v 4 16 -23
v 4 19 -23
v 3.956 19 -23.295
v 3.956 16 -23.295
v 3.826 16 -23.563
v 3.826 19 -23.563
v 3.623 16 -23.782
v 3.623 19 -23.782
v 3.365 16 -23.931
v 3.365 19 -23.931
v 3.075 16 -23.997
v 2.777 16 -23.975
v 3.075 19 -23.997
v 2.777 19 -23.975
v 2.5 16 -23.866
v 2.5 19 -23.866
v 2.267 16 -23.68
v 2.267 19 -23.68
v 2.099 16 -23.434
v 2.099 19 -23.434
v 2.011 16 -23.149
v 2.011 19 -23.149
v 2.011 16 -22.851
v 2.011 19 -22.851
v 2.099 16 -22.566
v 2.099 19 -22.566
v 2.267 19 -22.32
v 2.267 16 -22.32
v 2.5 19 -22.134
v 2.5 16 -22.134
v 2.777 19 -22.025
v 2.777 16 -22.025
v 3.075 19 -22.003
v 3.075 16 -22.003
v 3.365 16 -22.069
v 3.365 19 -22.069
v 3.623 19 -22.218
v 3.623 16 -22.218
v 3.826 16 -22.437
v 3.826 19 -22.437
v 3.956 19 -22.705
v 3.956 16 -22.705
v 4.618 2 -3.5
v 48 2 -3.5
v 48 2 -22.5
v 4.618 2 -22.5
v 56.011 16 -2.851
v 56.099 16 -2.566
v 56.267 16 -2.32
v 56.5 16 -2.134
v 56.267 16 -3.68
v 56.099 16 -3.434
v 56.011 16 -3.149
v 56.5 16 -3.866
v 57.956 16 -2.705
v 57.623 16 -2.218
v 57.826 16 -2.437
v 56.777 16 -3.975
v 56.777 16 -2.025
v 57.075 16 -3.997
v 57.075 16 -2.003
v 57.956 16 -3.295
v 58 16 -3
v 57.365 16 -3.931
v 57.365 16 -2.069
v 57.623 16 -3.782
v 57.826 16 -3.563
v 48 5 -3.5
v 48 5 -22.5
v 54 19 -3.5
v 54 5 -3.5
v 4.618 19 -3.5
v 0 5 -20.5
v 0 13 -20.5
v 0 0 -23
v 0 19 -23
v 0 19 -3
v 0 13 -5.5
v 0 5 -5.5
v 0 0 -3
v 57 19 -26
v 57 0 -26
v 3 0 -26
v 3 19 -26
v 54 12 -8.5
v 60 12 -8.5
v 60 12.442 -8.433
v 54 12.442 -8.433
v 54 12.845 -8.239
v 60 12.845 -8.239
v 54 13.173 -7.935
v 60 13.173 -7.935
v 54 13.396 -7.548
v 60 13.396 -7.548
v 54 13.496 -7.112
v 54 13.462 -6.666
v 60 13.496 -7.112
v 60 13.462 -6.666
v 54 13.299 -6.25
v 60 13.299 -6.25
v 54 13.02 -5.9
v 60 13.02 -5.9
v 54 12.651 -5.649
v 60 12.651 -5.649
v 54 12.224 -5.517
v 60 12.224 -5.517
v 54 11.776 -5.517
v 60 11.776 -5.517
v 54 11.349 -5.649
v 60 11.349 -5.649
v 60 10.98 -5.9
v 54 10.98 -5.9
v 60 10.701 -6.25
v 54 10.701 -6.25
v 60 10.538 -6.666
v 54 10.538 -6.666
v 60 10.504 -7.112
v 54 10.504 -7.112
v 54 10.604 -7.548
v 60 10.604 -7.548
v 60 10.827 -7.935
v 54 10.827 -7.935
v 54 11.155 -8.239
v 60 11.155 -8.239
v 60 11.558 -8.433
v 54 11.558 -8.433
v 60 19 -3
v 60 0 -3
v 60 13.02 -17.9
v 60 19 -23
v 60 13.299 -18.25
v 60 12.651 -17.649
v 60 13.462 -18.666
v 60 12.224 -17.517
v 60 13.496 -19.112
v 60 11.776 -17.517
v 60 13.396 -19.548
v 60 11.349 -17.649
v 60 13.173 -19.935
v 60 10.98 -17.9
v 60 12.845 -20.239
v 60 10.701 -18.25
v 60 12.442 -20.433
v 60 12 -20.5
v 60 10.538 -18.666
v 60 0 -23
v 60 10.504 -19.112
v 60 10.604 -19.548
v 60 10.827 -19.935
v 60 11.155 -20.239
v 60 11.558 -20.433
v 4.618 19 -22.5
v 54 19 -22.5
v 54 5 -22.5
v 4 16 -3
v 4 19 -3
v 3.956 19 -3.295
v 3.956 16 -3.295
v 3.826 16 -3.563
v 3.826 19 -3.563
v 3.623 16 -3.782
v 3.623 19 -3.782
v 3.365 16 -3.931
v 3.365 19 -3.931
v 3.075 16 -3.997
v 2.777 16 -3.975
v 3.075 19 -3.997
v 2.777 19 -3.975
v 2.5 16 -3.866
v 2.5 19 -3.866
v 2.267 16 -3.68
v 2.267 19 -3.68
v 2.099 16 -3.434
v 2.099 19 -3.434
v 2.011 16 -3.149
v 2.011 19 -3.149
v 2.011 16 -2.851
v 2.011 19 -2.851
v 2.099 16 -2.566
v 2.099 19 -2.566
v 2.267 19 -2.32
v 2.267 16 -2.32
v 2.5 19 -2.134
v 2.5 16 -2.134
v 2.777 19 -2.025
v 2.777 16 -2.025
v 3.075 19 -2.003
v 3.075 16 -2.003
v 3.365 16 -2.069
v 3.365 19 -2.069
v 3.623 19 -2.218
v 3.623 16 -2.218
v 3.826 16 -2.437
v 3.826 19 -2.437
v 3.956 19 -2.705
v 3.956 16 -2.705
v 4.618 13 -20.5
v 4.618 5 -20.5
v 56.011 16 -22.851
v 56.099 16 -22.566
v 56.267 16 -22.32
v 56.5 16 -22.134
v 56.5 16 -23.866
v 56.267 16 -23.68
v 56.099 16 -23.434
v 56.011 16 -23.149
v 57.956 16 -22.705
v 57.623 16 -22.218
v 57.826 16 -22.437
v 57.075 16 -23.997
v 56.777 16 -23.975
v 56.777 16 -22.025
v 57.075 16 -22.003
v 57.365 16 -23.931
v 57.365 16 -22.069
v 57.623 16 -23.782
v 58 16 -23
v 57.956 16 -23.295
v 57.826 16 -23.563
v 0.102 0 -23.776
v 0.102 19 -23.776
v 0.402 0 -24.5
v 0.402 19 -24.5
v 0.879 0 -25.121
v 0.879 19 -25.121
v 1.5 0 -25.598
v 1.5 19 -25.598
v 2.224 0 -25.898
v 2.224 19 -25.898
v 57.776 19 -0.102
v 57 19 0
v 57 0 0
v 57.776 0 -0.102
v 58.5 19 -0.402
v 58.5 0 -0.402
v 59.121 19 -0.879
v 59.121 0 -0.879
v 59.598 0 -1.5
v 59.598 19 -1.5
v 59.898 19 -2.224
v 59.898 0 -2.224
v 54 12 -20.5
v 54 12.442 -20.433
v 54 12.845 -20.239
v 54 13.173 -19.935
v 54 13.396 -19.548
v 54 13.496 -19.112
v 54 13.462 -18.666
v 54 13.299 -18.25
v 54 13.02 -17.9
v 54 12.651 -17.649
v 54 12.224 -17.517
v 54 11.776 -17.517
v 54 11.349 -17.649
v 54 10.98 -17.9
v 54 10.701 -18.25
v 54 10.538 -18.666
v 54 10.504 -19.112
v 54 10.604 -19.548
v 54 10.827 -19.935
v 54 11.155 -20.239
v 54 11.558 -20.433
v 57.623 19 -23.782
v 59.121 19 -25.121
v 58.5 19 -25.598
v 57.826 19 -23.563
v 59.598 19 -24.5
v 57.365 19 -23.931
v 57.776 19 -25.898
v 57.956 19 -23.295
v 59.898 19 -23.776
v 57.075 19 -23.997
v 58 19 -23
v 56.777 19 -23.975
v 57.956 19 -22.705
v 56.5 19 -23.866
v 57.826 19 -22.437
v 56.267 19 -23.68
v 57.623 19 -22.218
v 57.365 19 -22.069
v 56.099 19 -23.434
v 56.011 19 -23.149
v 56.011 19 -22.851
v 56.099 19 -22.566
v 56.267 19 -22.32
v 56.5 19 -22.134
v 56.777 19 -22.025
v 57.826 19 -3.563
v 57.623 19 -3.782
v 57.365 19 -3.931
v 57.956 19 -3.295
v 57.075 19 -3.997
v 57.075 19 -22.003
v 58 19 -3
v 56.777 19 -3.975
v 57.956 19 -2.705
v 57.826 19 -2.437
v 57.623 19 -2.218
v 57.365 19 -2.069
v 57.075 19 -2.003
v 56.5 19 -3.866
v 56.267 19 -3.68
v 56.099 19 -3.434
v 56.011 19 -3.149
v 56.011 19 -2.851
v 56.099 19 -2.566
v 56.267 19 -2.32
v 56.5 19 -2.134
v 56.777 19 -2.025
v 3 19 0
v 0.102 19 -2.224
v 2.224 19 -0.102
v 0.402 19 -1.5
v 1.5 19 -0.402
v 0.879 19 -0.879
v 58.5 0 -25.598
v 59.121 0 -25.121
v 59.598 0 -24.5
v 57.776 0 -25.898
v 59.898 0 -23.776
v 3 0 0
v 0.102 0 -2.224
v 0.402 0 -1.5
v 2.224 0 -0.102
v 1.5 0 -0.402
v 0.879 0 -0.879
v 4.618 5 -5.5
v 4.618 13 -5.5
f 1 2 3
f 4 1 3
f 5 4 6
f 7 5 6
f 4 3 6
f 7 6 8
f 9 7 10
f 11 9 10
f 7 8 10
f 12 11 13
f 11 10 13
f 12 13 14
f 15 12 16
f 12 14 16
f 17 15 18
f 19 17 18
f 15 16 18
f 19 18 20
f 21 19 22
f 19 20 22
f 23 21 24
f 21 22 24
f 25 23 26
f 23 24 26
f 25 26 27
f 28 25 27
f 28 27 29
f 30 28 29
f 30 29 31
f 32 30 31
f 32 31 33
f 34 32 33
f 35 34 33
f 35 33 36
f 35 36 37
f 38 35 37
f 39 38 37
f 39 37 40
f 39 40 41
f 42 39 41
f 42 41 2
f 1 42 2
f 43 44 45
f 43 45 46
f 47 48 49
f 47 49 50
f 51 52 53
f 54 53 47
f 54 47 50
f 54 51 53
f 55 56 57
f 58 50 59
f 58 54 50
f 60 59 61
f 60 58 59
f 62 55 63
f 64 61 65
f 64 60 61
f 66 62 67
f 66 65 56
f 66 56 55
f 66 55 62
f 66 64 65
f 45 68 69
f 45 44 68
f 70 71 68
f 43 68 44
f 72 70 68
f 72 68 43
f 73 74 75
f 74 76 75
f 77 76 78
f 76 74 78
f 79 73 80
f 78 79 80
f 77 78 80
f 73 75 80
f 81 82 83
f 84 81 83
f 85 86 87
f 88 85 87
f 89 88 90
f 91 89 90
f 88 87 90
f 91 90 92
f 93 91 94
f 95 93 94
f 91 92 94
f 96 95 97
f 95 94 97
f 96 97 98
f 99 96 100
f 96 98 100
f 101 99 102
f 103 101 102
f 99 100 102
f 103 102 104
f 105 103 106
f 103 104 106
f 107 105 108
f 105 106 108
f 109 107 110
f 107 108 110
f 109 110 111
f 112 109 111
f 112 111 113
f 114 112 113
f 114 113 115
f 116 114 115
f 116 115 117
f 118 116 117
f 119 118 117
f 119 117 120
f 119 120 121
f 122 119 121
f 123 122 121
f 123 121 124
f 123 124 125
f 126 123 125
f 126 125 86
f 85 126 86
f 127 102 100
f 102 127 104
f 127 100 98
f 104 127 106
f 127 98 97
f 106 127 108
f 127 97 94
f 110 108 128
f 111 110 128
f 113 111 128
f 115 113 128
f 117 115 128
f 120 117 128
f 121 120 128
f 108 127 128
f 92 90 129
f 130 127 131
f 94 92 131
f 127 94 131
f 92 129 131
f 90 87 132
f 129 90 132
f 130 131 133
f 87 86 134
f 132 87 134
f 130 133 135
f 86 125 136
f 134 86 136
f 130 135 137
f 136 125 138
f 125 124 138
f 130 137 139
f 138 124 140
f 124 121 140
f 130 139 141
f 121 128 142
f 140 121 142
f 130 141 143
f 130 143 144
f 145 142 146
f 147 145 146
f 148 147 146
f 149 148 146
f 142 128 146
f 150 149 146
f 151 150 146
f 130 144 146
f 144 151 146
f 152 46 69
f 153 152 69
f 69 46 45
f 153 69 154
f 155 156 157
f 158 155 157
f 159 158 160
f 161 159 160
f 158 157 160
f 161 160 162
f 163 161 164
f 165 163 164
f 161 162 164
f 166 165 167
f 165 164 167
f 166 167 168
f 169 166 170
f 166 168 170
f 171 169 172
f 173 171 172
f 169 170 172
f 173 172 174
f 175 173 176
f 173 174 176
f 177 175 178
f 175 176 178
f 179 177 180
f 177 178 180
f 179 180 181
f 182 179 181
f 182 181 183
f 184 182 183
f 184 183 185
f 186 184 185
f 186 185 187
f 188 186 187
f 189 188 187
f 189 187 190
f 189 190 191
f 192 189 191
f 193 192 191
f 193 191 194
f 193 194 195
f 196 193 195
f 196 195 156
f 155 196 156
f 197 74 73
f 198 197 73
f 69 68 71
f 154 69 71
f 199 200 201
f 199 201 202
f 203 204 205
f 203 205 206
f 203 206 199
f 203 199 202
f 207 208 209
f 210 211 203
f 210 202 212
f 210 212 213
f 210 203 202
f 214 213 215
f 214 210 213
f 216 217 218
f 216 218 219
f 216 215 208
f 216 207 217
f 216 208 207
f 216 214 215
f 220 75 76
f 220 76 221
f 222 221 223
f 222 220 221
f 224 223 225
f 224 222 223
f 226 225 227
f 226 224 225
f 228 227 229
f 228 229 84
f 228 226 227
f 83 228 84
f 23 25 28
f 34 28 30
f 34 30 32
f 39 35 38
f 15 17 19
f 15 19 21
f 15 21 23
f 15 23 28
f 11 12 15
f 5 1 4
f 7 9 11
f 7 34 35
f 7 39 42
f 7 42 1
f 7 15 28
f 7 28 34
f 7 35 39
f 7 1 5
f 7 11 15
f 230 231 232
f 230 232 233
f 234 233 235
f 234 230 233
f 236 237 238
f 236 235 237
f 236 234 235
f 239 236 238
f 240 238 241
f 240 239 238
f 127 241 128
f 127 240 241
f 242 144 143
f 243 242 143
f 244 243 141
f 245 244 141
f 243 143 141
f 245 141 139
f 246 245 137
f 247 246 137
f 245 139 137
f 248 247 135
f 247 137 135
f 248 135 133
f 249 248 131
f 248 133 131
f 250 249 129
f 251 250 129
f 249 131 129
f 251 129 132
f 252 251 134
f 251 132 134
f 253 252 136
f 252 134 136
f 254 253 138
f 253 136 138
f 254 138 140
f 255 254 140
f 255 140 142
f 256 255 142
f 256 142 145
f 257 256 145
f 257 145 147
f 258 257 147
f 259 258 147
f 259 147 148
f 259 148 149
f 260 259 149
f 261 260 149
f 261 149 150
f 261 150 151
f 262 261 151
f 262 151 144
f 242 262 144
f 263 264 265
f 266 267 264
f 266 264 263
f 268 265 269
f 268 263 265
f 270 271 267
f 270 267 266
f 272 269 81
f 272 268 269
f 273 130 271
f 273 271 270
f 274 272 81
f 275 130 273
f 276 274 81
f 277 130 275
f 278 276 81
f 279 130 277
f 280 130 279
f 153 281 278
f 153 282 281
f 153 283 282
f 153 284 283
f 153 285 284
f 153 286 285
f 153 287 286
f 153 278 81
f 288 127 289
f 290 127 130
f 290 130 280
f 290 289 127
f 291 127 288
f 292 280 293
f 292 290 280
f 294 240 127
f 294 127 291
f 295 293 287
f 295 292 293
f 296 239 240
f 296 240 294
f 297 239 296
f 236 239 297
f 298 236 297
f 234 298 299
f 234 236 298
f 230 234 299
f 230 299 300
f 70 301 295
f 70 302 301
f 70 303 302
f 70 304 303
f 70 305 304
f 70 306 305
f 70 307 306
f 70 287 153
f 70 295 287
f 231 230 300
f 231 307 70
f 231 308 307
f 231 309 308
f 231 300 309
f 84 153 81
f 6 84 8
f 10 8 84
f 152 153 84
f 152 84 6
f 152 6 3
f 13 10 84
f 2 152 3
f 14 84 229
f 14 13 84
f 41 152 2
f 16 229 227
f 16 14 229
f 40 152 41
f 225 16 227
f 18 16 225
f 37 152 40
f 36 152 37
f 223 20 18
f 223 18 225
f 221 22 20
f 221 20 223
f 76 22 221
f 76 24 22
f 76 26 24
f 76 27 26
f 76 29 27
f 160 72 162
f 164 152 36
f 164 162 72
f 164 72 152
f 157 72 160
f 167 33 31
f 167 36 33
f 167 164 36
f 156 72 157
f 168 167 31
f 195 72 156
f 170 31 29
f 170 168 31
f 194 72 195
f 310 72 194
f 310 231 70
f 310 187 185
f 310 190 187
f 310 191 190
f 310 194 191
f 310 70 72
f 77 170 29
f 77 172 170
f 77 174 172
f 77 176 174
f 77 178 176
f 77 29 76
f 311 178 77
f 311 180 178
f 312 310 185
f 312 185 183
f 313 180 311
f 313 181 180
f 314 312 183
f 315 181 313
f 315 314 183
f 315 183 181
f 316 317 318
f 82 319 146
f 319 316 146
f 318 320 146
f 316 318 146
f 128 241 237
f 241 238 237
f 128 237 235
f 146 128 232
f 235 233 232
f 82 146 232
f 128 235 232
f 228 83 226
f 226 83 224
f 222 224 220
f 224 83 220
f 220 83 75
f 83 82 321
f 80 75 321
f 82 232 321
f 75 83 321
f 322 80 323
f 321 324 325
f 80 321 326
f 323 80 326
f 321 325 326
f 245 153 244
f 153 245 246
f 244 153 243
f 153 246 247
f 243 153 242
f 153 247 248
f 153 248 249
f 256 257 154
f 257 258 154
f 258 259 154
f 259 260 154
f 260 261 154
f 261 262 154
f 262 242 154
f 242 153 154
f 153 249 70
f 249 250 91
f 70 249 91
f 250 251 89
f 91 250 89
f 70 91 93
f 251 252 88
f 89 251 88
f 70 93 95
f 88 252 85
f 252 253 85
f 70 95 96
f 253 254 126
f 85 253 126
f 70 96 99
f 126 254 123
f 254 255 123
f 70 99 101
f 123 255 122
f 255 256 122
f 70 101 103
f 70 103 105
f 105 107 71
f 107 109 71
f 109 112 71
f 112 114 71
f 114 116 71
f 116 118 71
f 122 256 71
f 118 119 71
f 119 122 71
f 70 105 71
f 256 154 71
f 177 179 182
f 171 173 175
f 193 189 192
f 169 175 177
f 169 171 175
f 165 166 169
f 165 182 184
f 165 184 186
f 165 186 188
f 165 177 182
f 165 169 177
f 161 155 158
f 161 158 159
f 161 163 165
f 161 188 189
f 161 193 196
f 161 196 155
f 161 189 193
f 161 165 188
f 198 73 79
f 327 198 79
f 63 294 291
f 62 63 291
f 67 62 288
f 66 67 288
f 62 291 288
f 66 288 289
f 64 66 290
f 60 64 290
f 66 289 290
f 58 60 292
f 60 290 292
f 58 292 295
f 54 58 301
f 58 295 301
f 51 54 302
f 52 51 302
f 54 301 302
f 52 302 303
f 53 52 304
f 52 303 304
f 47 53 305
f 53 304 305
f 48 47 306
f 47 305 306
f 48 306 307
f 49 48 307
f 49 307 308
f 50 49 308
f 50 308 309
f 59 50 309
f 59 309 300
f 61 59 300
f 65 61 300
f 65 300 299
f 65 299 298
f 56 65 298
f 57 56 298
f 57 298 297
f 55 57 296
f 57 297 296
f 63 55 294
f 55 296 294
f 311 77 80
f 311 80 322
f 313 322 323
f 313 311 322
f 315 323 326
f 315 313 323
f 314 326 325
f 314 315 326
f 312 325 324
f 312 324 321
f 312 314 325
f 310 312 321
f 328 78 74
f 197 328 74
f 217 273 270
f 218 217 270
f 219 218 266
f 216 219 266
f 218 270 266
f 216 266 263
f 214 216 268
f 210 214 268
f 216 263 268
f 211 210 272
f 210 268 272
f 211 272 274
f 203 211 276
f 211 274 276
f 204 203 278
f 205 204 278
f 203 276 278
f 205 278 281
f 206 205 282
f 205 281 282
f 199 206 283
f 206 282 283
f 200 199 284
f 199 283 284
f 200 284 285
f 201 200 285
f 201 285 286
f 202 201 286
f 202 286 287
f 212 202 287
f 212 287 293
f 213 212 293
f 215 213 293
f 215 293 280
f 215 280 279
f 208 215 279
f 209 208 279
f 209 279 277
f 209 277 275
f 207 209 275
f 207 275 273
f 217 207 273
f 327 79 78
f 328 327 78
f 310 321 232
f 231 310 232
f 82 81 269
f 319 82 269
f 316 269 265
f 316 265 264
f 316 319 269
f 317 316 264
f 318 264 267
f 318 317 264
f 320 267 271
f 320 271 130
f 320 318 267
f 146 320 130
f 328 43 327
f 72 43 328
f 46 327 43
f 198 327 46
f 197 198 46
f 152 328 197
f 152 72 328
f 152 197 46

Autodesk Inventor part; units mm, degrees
ref_plane "YZ Plane" through (0, 0, 0) normal (1, 0, 0) x (0, 1, 0)
ref_plane "XZ Plane" through (0, 0, 0) normal (0, 1, 0) x (-1, 0, 0)
ref_plane "XY Plane" through (0, 0, 0) normal (0, 0, 1) x (1, 0, 0)
sketch "Sketch1" plane through (0, 0, 0) normal (0, 1, 0) x (-1, 0, 0)
  line L0 (0, 0) -> (-60, 0)
  line L1 (-60, 0) -> (-60, -26)
  line L2 (-60, -26) -> (0, -26)
  line L3 (0, -26) -> (0, 0)
  line L4 (-54, -3.5) -> (-6, -3.5)
  line L5 (-6, -3.5) -> (-6, -22.5)
  line L6 (-6, -22.5) -> (-54, -22.5)
  line L7 (-54, -22.5) -> (-54, -3.5)
  line L8 (-54, -3.5) -> (-6, -22.5) construction
  line L9 (-6, -3.5) -> (-54, -22.5) construction
  point P0 (-30, -13)
  dimension "d0" = 60
  dimension "d2" = 48
  dimension "d3" = 6
  dimension "d4" = 6
  dimension "d36" = 19
  dimension "d37" = 3.5
  dimension "d38" = 3.5
  dimension "d39" = 26
extrude "Extrusion1" add sketch "Sketch1" along normal blind 2 contours L3 L2 L1 L0 | L4 L5 L6 L7
extrude "Extrusion2" add sketch "Sketch1" along normal blind 19
sketch "Sketch2" plane through (0, 2, 0) normal (0, 1, 0) x (1, 0, 0)
  line L0 (6, 3.5) -> (54, 3.5) projected
  line L1 (54, 22.5) -> (6, 22.5) projected
  line L2 (54, 3.5) -> (48, 3.5)
  line L3 (48, 3.5) -> (48, 22.5)
  line L4 (48, 22.5) -> (54, 22.5)
  line L5 (54, 22.5) -> (54, 3.5)
  line L6 (6, 3.5) -> (6, 22.5) projected
  point P0 (0, 0)
  point P1 (48, 3.5)
  dimension "d11" = 42
extrude "Extrusion3" add sketch "Sketch2" along normal blind 3 contours L3 L1 L5 L0
sketch "Sketch3" plane through (0, 0, -3) normal (1, 0, 0) x (0, 0, -1)
  line L0 (-3, 0) -> (23, 0) projected
  line L1 (23, 0) -> (23, 19) projected
  line L2 (-3, 19) -> (23, 19) projected
  line L3 (-3, 0) -> (-3, 19) projected
  line L4 (2.5, 13) -> (17.5, 13)
  line L5 (17.5, 13) -> (17.5, 5)
  line L6 (17.5, 5) -> (2.5, 5)
  line L7 (2.5, 5) -> (2.5, 13)
  line L8 (2.5, 13) -> (17.5, 5) construction
  line L9 (17.5, 13) -> (2.5, 5) construction
  point P0 (-3, 0)
  point P1 (10, 9)
  point P2 (23, 9.5)
  point P3 (-3, 9.5)
  dimension "d14" = 5
  dimension "d15" = 8
  dimension "d16" = 5.5
  dimension "d17" = 5.5
  dimension "d18" = 15
extrude "Extrusion4" cut sketch "Sketch3" along normal blind 7.5 contours L4 L5 L6 L7
sketch "Sketch4" plane through (60, 0, 0) normal (1, 0, 0) x (0, 0, -1)
  circle A0 centre (7, 12) radius 1.5
  circle A1 centre (19, 12) radius 1.5
  line L0 (0, 0) -> (26, 0) projected
  line L1 (0, 0) -> (0, 19) projected
  line L2 (26, 0) -> (26, 19) projected
  dimension "d21" = 3
  dimension "d22" = 3
  dimension "d25" = 12
  dimension "d26" = 12
  dimension "d27" = 7
  dimension "d28" = 7
extrude "Extrusion5" cut sketch "Sketch4" against normal blind 7.5
fillet "Fillet1" radius 3 4 edges at (0, 9.5, 0) (0, 9.5, -26) (60, 9.5, 0) (60, 9.5, -26)
sketch "Sketch5" plane through (0, 19, 0) normal (0, 1, 0) x (1, 0, 0)
  arc A0 (60, 23) -> (57, 26) centre (57, 23) ccw projected
  line L0 (57, 26) -> (3, 26) projected
  arc A1 (3, 26) -> (0, 23) centre (3, 23) ccw projected
  line L1 (0, 23) -> (0, 3) projected
  arc A2 (0, 3) -> (3, 0) centre (3, 3) ccw projected
  line L2 (3, 0) -> (57, 0) projected
  arc A3 (57, 0) -> (60, 3) centre (57, 3) ccw projected
  line L3 (60, 3) -> (60, 23) projected
  line L4 (54, 3.5) -> (6, 3.5) projected
  line L5 (6, 3.5) -> (6, 22.5) projected
  line L6 (6, 22.5) -> (54, 22.5) projected
  line L7 (54, 22.5) -> (54, 3.5) projected
  circle A4 centre (3, 3) radius 1
  circle A5 centre (3, 23) radius 1
  circle A6 centre (57, 3) radius 1
  circle A7 centre (57, 23) radius 1
  point P0 (0, 0)
  dimension "d30" = 2
  dimension "d31" = 2
  dimension "d32" = 2
  dimension "d33" = 2
extrude "Extrusion6" cut sketch "Sketch5" against normal blind 3 contours A4 | A5 | A6 | A7
sketch "Sketch6" plane through (0, 19, 0) normal (0, 1, 0) x (1, 0, 0)
  circle A0 centre (57, 3) radius 1 projected
  circle A1 centre (3, 23) radius 1 projected
  circle A2 centre (57, 23) radius 1 projected
  circle A3 centre (3, 3) radius 1 projected
  arc A4 (60, 23) -> (57, 26) centre (57, 23) ccw projected
  line L0 (57, 26) -> (3, 26) projected
  arc A5 (3, 26) -> (0, 23) centre (3, 23) ccw projected
  line L1 (0, 23) -> (0, 3) projected
  arc A6 (0, 3) -> (3, 0) centre (3, 3) ccw projected
  line L2 (3, 0) -> (57, 0) projected
  arc A7 (57, 0) -> (60, 3) centre (57, 3) ccw projected
  line L3 (60, 3) -> (60, 23) projected
  line L4 (54, 3.5) -> (6, 3.5) projected
  line L5 (6, 3.5) -> (6, 22.5) projected
  line L6 (6, 22.5) -> (54, 22.5) projected
  line L7 (54, 22.5) -> (54, 3.5) projected
  line L8 (6, 22.5) -> (6, 3.5) projected
  line L9 (6, 3.5) -> (4.6176, 3.5)
  line L10 (4.6176, 3.5) -> (4.6176, 22.5)
  line L11 (4.6176, 22.5) -> (6, 22.5)
  line L12 (6, 22.5) -> (6, 3.5)
  point P0 (0, 0)
extrude "Extrusion7" cut sketch "Sketch6" against normal blind 17 contours L9 L10 L11 L5
equation "\"d38\" = d37"
equation "\"d17\" = d16"
equation "\"d26\" = d25"
equation "\"d28\" = d27"
properties part number "bawah"
